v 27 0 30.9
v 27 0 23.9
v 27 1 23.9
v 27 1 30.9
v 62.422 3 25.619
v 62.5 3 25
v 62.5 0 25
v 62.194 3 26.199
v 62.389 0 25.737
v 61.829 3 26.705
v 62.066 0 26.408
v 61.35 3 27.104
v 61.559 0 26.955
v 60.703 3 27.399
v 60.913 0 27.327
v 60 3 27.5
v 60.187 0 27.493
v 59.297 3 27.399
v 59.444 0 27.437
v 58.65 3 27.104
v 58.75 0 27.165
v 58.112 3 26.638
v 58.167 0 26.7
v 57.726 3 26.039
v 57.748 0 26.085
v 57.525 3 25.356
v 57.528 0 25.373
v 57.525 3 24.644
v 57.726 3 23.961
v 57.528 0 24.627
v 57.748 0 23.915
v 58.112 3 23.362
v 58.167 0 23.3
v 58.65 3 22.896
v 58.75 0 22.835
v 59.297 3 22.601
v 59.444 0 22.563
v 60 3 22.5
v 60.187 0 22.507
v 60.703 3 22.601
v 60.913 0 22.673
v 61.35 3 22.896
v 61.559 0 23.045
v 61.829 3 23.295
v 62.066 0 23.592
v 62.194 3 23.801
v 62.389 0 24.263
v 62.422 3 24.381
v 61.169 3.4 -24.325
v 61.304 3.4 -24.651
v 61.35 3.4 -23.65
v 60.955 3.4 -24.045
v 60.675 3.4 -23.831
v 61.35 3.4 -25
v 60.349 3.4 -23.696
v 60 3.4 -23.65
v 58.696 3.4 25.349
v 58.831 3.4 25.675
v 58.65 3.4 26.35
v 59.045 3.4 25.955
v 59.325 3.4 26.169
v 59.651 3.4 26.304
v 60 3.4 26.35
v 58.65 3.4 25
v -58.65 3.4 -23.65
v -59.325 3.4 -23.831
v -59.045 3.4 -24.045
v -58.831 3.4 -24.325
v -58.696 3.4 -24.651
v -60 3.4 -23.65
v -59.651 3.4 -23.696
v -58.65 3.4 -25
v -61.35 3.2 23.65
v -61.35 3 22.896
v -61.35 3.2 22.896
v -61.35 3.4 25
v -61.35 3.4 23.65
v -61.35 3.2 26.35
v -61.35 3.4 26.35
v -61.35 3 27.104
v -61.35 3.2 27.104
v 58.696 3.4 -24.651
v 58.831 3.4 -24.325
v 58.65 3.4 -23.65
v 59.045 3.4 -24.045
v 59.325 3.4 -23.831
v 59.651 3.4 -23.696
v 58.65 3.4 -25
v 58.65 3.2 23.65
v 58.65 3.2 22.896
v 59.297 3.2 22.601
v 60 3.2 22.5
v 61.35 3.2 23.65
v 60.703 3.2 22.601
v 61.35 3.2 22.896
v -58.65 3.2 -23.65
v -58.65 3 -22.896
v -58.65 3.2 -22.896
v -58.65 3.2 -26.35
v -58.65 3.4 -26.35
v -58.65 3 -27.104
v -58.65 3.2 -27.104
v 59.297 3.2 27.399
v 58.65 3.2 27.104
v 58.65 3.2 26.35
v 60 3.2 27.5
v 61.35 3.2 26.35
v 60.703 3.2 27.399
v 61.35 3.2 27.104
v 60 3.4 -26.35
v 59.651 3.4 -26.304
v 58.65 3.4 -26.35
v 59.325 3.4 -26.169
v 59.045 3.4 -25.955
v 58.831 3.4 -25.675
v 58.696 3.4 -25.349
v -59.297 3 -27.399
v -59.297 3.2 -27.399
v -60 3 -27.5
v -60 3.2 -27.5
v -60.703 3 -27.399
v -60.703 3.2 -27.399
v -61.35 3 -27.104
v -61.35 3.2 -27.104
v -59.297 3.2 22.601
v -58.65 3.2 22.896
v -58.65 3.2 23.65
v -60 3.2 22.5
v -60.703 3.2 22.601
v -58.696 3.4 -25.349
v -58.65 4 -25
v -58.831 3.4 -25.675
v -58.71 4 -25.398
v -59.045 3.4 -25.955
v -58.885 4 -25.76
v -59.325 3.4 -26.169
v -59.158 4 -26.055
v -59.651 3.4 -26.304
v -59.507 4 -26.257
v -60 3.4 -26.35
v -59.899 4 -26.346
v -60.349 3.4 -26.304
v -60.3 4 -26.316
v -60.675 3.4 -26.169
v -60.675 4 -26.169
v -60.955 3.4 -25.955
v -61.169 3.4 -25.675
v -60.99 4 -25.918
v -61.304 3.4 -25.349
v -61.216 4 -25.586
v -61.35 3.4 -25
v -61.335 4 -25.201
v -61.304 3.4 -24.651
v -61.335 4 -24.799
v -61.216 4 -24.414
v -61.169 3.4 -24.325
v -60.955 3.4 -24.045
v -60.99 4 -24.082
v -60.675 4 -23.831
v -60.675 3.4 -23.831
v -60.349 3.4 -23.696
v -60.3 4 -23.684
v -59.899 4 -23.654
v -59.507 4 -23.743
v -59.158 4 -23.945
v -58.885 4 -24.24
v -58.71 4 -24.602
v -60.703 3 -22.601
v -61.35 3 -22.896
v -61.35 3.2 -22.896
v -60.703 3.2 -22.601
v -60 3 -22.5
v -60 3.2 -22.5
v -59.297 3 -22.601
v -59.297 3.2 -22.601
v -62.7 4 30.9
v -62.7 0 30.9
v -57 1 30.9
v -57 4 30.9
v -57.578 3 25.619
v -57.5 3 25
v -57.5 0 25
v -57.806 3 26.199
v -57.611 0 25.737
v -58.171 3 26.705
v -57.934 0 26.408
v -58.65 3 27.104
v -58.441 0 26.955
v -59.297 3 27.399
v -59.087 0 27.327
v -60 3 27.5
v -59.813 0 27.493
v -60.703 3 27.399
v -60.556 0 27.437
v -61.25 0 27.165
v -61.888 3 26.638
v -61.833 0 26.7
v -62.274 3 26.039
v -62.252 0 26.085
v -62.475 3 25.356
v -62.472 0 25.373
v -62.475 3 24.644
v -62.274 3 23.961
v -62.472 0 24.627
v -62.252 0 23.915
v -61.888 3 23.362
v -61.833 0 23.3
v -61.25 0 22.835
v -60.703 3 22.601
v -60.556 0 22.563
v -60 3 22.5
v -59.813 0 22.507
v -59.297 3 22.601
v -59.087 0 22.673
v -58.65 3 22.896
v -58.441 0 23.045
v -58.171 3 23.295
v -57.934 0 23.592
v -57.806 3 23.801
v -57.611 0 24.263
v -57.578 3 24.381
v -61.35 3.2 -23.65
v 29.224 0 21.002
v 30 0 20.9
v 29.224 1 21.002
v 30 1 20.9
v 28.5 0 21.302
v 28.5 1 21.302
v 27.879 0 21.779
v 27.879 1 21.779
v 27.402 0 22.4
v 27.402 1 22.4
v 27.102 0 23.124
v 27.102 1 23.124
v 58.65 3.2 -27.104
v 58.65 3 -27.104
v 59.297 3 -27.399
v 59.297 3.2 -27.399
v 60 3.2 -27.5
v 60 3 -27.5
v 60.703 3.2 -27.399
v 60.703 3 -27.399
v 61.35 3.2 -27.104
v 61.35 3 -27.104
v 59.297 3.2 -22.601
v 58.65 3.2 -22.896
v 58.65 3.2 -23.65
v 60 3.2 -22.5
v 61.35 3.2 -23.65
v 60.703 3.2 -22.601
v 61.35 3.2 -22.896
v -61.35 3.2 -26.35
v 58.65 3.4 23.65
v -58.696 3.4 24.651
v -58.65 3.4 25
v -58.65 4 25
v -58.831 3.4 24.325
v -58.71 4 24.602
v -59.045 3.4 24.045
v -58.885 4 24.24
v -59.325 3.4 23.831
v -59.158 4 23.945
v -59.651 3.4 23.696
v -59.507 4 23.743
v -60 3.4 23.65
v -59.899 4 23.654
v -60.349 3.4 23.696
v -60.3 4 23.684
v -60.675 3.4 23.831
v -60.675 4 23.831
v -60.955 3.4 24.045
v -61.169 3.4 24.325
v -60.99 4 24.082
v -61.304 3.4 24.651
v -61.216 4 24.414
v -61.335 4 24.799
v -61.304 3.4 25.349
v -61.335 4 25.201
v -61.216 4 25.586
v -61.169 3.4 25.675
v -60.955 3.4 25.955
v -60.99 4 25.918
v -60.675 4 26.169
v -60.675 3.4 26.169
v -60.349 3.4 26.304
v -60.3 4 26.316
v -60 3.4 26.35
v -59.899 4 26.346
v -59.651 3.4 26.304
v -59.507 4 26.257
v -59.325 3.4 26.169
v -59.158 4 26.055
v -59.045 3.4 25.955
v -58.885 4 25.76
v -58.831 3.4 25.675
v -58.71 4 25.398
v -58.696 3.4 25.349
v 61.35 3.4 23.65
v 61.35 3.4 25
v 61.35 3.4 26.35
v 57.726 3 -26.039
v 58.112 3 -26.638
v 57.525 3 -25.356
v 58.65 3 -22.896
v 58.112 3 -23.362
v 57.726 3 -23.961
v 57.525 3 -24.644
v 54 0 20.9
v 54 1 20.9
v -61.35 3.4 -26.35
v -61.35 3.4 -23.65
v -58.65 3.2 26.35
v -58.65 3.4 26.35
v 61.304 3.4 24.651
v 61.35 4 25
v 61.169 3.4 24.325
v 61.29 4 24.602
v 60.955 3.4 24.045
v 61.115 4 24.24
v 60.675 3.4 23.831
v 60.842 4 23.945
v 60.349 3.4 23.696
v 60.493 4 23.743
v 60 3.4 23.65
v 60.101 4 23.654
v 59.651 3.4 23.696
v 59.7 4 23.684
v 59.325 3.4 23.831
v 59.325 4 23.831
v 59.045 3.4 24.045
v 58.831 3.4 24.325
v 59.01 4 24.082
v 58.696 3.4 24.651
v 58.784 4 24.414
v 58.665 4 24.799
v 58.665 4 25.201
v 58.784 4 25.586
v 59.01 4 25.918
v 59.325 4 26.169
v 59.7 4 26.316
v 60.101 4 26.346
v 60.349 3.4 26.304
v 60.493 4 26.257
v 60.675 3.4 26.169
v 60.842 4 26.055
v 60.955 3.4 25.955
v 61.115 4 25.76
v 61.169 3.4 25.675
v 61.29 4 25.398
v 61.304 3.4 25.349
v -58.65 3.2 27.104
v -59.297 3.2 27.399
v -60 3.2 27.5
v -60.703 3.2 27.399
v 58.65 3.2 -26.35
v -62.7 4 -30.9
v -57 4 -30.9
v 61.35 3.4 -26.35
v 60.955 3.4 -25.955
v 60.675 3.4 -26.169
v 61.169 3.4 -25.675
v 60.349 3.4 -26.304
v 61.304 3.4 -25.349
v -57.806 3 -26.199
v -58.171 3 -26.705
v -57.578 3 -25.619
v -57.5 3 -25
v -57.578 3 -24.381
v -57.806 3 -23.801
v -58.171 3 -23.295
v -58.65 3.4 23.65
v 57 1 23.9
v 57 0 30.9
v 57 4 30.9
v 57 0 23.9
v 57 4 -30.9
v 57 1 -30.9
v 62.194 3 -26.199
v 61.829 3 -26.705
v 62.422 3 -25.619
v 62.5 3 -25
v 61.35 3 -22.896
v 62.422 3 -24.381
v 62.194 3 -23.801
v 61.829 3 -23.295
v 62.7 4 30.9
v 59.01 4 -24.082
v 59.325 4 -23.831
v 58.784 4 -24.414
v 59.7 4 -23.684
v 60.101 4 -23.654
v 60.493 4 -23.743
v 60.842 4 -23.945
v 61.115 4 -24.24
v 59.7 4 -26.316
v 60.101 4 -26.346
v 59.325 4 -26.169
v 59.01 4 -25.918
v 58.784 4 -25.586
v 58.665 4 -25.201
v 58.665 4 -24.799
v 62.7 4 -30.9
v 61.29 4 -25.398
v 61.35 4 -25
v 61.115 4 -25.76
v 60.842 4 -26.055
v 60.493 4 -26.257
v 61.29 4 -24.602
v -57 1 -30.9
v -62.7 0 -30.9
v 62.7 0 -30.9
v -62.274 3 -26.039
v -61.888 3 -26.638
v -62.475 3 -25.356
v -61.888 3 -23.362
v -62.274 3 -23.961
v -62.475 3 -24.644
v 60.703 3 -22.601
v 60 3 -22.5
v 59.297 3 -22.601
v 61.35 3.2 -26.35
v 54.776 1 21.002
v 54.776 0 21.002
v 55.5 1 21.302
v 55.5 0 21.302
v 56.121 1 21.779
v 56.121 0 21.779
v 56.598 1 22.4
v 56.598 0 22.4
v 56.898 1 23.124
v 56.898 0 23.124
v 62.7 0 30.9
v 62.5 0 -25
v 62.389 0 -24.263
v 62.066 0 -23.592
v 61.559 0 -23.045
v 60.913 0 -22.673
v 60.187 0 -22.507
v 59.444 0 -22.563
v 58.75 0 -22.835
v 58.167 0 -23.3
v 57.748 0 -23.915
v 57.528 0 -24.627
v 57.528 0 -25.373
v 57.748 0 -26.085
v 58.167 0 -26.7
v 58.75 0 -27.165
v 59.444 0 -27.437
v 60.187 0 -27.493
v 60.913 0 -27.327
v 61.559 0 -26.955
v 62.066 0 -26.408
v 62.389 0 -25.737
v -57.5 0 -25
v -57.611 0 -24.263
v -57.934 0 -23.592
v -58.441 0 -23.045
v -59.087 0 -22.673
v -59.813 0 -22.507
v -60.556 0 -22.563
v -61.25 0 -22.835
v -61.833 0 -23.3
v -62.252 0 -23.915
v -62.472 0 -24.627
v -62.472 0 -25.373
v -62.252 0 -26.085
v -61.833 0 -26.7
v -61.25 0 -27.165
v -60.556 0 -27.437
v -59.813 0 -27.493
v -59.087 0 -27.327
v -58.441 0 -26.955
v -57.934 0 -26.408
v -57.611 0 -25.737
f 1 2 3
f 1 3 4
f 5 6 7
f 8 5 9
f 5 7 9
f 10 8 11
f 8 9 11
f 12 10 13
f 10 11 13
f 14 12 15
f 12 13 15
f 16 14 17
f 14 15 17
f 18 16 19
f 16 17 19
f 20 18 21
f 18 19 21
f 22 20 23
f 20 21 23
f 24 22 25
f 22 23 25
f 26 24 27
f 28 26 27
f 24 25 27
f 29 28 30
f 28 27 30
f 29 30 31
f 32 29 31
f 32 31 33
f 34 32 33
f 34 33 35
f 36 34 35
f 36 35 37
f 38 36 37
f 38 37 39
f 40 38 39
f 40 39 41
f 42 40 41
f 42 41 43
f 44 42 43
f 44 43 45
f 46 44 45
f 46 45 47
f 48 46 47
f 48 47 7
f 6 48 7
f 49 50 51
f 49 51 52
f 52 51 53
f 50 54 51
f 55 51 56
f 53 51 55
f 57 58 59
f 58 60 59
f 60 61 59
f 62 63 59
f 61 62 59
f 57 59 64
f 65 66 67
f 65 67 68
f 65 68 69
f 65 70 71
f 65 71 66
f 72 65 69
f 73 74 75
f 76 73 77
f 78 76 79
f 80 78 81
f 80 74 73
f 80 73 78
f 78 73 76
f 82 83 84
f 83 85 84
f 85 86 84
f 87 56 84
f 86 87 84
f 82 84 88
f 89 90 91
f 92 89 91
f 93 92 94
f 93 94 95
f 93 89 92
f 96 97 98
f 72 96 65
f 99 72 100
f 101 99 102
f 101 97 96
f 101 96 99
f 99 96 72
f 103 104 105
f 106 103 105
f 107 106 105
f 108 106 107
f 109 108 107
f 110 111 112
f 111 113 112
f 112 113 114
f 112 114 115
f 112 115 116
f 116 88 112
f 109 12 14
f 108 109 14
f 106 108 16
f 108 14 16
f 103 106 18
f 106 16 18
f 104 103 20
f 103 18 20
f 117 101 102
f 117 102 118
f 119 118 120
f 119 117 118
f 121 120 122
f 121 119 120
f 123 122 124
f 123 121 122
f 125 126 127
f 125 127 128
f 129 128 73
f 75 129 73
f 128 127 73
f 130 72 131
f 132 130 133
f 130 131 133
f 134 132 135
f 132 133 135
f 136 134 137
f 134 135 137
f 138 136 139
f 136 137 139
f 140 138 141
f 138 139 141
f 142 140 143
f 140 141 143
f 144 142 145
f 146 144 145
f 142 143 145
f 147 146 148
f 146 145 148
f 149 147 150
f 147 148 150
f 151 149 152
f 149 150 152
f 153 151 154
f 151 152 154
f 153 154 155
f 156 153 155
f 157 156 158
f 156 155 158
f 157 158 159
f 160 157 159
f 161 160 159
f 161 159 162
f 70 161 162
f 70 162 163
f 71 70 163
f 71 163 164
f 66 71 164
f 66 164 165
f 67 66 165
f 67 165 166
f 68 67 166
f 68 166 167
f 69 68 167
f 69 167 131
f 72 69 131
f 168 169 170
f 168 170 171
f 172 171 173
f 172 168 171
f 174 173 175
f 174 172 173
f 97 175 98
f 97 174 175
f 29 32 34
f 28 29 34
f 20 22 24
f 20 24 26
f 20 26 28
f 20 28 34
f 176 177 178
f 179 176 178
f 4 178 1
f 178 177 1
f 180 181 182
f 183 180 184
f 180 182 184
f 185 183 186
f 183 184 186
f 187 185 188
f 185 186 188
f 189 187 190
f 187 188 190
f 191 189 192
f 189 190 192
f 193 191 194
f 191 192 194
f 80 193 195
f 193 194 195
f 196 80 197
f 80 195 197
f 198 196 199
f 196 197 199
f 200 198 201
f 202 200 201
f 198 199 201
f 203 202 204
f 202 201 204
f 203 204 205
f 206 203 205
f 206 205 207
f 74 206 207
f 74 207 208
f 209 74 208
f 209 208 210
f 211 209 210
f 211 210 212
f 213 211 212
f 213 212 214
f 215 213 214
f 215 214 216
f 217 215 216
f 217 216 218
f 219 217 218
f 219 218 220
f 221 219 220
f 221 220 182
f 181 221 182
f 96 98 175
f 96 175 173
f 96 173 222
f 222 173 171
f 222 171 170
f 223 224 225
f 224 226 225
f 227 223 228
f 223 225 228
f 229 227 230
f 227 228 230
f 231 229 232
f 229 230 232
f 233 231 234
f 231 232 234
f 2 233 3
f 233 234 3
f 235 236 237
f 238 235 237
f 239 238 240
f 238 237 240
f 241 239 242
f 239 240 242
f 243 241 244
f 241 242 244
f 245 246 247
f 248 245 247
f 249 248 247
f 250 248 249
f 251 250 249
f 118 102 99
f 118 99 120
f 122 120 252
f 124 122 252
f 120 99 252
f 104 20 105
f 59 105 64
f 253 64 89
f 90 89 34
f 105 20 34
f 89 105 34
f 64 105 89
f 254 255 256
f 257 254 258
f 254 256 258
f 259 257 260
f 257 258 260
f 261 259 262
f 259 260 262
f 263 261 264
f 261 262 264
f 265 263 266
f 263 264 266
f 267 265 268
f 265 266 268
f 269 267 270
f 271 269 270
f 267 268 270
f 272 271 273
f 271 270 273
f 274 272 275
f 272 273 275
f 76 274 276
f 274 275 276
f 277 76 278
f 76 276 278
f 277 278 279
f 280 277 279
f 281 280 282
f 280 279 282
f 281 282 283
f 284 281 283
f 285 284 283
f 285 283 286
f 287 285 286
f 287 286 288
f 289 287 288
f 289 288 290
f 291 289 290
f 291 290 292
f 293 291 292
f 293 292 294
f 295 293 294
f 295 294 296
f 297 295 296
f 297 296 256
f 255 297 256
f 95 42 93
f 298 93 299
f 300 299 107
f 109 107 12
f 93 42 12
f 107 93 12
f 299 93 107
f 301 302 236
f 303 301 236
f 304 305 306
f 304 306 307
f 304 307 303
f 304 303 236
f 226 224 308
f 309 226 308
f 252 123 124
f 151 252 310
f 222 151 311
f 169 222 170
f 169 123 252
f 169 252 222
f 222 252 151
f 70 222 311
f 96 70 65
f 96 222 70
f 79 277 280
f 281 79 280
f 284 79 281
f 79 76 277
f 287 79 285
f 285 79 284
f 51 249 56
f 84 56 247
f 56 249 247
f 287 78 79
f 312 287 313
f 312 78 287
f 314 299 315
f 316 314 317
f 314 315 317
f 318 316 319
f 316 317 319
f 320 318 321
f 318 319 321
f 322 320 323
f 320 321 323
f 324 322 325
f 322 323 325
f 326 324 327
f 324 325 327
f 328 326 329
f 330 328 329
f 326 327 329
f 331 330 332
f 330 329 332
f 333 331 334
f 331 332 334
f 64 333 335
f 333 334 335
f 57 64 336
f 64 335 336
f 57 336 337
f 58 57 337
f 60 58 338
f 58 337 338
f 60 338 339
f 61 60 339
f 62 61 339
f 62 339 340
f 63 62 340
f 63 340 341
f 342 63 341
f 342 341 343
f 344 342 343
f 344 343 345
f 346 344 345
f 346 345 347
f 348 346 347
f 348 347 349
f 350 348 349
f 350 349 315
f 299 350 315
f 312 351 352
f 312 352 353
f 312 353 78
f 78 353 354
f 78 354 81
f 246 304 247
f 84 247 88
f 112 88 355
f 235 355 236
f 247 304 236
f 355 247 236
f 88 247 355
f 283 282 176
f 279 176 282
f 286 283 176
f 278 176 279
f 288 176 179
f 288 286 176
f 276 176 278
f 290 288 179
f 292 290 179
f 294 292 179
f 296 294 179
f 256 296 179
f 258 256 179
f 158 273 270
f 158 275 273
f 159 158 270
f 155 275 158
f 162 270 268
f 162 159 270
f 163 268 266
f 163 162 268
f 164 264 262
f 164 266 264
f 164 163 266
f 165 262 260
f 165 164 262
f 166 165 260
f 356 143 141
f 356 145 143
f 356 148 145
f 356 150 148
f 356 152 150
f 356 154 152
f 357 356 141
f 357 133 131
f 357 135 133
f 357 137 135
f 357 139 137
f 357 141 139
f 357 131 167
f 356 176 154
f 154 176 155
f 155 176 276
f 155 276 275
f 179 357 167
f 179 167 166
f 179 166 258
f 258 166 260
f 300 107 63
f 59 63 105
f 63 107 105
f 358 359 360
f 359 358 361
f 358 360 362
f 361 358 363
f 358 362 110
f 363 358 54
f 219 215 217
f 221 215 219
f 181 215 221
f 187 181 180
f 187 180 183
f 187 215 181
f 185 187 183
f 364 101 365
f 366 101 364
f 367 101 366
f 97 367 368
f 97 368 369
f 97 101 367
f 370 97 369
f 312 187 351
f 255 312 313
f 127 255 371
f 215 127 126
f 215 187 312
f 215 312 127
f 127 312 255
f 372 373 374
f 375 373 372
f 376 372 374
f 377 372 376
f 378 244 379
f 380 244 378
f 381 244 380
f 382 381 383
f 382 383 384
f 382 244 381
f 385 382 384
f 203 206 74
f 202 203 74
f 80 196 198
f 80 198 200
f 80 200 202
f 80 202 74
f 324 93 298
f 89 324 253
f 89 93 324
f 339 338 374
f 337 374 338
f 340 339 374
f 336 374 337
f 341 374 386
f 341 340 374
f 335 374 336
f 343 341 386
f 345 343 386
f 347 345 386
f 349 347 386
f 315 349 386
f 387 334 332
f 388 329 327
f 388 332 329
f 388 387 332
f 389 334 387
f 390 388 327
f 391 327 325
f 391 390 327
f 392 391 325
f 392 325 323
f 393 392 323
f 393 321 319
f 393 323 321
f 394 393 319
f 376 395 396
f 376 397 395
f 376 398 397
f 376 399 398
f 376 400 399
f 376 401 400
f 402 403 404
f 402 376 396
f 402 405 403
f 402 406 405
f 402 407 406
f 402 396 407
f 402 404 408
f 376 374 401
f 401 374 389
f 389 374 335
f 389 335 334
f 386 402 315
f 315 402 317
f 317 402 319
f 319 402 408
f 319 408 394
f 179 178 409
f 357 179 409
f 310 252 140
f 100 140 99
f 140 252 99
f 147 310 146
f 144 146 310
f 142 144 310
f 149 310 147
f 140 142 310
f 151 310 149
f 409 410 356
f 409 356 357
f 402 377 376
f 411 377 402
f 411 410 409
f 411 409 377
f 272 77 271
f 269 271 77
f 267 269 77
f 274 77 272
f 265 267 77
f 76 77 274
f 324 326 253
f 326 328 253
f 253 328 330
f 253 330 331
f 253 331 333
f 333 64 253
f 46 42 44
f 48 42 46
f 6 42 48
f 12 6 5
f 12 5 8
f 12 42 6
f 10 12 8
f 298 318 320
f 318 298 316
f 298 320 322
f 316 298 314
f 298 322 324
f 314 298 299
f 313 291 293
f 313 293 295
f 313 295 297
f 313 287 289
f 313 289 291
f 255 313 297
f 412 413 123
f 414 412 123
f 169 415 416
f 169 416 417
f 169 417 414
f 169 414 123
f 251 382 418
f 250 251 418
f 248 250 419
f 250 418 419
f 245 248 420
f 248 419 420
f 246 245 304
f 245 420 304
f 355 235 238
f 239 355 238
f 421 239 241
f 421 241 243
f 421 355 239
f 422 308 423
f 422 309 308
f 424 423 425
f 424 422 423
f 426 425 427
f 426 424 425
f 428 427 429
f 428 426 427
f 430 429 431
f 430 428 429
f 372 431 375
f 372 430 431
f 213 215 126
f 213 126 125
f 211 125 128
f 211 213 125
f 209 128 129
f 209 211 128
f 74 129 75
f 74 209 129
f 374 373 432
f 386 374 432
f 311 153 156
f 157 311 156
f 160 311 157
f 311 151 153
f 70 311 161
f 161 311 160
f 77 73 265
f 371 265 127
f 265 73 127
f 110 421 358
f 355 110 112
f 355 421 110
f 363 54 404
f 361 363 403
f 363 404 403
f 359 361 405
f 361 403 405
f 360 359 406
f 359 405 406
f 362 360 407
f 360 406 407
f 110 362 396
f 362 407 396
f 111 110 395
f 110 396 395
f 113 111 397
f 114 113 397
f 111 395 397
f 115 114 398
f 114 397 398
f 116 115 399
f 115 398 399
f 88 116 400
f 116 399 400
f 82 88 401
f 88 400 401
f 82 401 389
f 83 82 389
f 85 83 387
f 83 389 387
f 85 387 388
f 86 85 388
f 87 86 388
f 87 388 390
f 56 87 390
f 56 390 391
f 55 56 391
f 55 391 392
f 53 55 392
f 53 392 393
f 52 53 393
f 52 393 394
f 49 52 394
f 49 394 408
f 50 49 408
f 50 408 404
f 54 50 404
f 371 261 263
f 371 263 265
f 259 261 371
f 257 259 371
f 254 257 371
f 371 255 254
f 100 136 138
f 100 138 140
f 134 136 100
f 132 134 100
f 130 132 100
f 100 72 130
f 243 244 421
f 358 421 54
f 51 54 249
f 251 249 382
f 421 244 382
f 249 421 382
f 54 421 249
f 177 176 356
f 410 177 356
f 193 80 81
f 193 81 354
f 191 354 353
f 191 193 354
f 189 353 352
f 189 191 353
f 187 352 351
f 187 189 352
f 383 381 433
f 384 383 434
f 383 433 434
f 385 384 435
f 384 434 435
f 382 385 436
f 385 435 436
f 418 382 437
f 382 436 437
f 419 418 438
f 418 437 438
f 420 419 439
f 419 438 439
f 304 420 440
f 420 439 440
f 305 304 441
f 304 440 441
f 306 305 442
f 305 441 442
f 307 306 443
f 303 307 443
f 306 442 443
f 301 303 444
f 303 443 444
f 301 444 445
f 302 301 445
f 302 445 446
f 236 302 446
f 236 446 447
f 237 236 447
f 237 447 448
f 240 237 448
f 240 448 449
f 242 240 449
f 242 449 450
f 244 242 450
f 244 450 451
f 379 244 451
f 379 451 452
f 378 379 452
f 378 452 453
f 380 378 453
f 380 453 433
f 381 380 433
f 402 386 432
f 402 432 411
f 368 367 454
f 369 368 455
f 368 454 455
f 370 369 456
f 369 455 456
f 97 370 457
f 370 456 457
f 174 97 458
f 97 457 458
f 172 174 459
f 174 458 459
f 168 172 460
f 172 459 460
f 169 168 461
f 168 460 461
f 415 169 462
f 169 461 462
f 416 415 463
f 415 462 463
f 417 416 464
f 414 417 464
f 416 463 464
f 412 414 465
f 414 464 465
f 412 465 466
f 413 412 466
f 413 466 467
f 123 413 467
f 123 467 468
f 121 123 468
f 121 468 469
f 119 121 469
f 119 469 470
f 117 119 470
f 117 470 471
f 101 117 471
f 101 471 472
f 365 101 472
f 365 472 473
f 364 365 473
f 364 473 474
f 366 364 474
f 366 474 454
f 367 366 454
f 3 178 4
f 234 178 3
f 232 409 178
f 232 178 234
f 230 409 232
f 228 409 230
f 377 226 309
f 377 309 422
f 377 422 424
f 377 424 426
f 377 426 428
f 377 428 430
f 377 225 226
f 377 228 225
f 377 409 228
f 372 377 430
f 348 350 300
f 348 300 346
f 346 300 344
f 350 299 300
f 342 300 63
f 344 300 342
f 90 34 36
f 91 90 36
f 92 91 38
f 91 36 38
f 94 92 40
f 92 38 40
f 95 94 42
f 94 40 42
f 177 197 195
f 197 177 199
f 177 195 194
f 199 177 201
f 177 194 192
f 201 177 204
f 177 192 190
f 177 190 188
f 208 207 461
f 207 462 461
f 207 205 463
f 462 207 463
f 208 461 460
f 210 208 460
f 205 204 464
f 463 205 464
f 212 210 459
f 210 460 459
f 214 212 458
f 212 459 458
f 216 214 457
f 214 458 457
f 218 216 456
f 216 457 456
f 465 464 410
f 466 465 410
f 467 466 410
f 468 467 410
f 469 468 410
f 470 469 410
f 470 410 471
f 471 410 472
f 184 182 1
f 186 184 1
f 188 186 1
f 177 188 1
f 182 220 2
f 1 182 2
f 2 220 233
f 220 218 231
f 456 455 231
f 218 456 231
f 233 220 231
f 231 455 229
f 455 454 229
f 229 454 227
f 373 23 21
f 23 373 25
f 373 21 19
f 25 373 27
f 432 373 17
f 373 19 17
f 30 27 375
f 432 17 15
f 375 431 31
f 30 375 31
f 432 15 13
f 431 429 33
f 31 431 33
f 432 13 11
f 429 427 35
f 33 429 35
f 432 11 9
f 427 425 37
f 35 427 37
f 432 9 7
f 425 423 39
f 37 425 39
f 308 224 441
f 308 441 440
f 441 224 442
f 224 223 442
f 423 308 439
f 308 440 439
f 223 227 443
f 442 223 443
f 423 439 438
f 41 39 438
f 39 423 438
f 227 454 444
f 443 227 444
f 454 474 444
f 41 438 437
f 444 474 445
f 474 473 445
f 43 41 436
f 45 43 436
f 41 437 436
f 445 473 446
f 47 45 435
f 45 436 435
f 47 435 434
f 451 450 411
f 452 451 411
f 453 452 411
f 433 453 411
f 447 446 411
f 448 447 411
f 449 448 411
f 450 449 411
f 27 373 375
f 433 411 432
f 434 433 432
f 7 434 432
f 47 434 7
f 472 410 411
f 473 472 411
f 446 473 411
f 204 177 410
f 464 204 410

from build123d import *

# Parameters (mm, degrees)
SKETCH1_W           = 126
SKETCH1_H           = 61.8
BOSS_EXTRUDE1_DEPTH = 1
SKETCH2_W           = 6
SKETCH2_H           = 61.8
BOSS_EXTRUDE2_DEPTH = 3
SKETCH3_R           = 1.35
CUT_EXTRUDE1_DEPTH  = 5
SKETCH4_R           = 2.5
CUT_EXTRUDE2_DEPTH  = 3
SKETCH5_W           = 30
SKETCH5_H           = 10
CUT_EXTRUDE3_DEPTH  = 5
FILLET1_R           = 3
CUT_EXTRUDE4_DEPTH  = 0.2
SKETCH7_W           = 2.7
SKETCH7_H           = 2.7
CUT_EXTRUDE5_DEPTH  = 0.2
SKETCH8_W           = 0.3
SKETCH8_H           = 61.8
CUT_EXTRUDE6_DEPTH  = 5


with BuildPart() as part:
    # Sketch1 → Boss-Extrude1 (new body)
    with BuildSketch(Plane(origin=(0, 0, 0), x_dir=(1, 0, 0), z_dir=(0, 1, 0))):
        Rectangle(SKETCH1_W, SKETCH1_H)
    extrude(amount=BOSS_EXTRUDE1_DEPTH)

    # Sketch2 → Boss-Extrude2 (add)
    with BuildSketch(Plane(origin=(0, 1, 0), x_dir=(1, 0, 0), z_dir=(0, 1, 0))):
        with Locations((-60, 0)):
            Rectangle(SKETCH2_W, SKETCH2_H)
        with Locations((60, 0)):
            Rectangle(SKETCH2_W, SKETCH2_H)
    extrude(amount=BOSS_EXTRUDE2_DEPTH)

    # Sketch3 → Cut-Extrude1 (cut, through all)
    with BuildSketch(Plane(origin=(0, 4, 0), x_dir=(1, 0, 0), z_dir=(0, 1, 0))):
        with Locations((-60, 25)):
            Circle(SKETCH3_R)
        with Locations((-60, -25)):
            Circle(SKETCH3_R)
        with Locations((60, -25)):
            Circle(SKETCH3_R)
        with Locations((60, 25)):
            Circle(SKETCH3_R)
    extrude(amount=-CUT_EXTRUDE1_DEPTH, mode=Mode.SUBTRACT)

    # Sketch4 → Cut-Extrude2 (cut)
    with BuildSketch(Plane.XZ):
        with Locations((60, -25)):
            Circle(SKETCH4_R)
        with Locations((60, 25)):
            Circle(SKETCH4_R)
        with Locations((-60, 25)):
            Circle(SKETCH4_R)
        with Locations((-60, -25)):
            Circle(SKETCH4_R)
    extrude(amount=-CUT_EXTRUDE2_DEPTH, mode=Mode.SUBTRACT)

    # Sketch5 → Cut-Extrude3 (cut, through all)
    with BuildSketch(Plane.XZ):
        with Locations((42, 25.9)):
            Rectangle(SKETCH5_W, SKETCH5_H)
    extrude(amount=-CUT_EXTRUDE3_DEPTH, mode=Mode.SUBTRACT)

    # Fillet1
    fillet1_edges = [part.edges().sort_by_distance(p)[0] for p in [
        (27, 0.5, 20.9),
        (57, 0.5, 20.9),
    ]]
    fillet(fillet1_edges, radius=FILLET1_R)

    # Sketch6 → Cut-Extrude4 (cut)
    with BuildSketch(Plane.XZ.offset(-3)):
        with BuildLine():
            Line((-61.35, 22.895837459), (-61.35, 27.104162541))
            ThreePointArc((-61.35, 27.104162541), (-60, 27.5), (-58.65, 27.104162541))
            Line((-58.65, 27.104162541), (-58.65, 22.895837459))
            ThreePointArc((-58.65, 22.895837459), (-60, 22.5), (-61.35, 22.895837459))
        make_face()
        with BuildLine():
            Line((-61.35, -27.104162541), (-61.35, -22.895837459))
            ThreePointArc((-61.35, -22.895837459), (-60, -22.5), (-58.65, -22.895837459))
            Line((-58.65, -22.895837459), (-58.65, -27.104162541))
            ThreePointArc((-58.65, -27.104162541), (-60, -27.5), (-61.35, -27.104162541))
        make_face()
    cut_extrude4 = extrude(amount=-CUT_EXTRUDE4_DEPTH, mode=Mode.SUBTRACT)

    # Sketch7 → Cut-Extrude5 (cut)
    with BuildSketch(Plane.XZ.offset(-3.2)):
        with Locations((-60, -25)):
            Rectangle(SKETCH7_W, SKETCH7_H)
        with Locations((-60, 25)):
            Rectangle(SKETCH7_W, SKETCH7_H)
    cut_extrude5 = extrude(amount=-CUT_EXTRUDE5_DEPTH, mode=Mode.SUBTRACT)

    # Mirror1: Cut-Extrude4, Cut-Extrude5 across plane
    add(cut_extrude4.mirror(Plane(origin=(0, 0, 0), x_dir=(0, 0, 1), z_dir=(1, 0, 0))), mode=Mode.SUBTRACT)
    add(cut_extrude5.mirror(Plane(origin=(0, 0, 0), x_dir=(0, 0, 1), z_dir=(1, 0, 0))), mode=Mode.SUBTRACT)

    # Sketch8 → Cut-Extrude6 (cut, through all)
    with BuildSketch(Plane(origin=(0, 4, 0), x_dir=(1, 0, 0), z_dir=(0, 1, 0))):
        with Locations((-62.85, 0)):
            Rectangle(SKETCH8_W, SKETCH8_H)
        with Locations((62.85, 0)):
            Rectangle(SKETCH8_W, SKETCH8_H)
    extrude(amount=-CUT_EXTRUDE6_DEPTH, mode=Mode.SUBTRACT)


solid = part.part
